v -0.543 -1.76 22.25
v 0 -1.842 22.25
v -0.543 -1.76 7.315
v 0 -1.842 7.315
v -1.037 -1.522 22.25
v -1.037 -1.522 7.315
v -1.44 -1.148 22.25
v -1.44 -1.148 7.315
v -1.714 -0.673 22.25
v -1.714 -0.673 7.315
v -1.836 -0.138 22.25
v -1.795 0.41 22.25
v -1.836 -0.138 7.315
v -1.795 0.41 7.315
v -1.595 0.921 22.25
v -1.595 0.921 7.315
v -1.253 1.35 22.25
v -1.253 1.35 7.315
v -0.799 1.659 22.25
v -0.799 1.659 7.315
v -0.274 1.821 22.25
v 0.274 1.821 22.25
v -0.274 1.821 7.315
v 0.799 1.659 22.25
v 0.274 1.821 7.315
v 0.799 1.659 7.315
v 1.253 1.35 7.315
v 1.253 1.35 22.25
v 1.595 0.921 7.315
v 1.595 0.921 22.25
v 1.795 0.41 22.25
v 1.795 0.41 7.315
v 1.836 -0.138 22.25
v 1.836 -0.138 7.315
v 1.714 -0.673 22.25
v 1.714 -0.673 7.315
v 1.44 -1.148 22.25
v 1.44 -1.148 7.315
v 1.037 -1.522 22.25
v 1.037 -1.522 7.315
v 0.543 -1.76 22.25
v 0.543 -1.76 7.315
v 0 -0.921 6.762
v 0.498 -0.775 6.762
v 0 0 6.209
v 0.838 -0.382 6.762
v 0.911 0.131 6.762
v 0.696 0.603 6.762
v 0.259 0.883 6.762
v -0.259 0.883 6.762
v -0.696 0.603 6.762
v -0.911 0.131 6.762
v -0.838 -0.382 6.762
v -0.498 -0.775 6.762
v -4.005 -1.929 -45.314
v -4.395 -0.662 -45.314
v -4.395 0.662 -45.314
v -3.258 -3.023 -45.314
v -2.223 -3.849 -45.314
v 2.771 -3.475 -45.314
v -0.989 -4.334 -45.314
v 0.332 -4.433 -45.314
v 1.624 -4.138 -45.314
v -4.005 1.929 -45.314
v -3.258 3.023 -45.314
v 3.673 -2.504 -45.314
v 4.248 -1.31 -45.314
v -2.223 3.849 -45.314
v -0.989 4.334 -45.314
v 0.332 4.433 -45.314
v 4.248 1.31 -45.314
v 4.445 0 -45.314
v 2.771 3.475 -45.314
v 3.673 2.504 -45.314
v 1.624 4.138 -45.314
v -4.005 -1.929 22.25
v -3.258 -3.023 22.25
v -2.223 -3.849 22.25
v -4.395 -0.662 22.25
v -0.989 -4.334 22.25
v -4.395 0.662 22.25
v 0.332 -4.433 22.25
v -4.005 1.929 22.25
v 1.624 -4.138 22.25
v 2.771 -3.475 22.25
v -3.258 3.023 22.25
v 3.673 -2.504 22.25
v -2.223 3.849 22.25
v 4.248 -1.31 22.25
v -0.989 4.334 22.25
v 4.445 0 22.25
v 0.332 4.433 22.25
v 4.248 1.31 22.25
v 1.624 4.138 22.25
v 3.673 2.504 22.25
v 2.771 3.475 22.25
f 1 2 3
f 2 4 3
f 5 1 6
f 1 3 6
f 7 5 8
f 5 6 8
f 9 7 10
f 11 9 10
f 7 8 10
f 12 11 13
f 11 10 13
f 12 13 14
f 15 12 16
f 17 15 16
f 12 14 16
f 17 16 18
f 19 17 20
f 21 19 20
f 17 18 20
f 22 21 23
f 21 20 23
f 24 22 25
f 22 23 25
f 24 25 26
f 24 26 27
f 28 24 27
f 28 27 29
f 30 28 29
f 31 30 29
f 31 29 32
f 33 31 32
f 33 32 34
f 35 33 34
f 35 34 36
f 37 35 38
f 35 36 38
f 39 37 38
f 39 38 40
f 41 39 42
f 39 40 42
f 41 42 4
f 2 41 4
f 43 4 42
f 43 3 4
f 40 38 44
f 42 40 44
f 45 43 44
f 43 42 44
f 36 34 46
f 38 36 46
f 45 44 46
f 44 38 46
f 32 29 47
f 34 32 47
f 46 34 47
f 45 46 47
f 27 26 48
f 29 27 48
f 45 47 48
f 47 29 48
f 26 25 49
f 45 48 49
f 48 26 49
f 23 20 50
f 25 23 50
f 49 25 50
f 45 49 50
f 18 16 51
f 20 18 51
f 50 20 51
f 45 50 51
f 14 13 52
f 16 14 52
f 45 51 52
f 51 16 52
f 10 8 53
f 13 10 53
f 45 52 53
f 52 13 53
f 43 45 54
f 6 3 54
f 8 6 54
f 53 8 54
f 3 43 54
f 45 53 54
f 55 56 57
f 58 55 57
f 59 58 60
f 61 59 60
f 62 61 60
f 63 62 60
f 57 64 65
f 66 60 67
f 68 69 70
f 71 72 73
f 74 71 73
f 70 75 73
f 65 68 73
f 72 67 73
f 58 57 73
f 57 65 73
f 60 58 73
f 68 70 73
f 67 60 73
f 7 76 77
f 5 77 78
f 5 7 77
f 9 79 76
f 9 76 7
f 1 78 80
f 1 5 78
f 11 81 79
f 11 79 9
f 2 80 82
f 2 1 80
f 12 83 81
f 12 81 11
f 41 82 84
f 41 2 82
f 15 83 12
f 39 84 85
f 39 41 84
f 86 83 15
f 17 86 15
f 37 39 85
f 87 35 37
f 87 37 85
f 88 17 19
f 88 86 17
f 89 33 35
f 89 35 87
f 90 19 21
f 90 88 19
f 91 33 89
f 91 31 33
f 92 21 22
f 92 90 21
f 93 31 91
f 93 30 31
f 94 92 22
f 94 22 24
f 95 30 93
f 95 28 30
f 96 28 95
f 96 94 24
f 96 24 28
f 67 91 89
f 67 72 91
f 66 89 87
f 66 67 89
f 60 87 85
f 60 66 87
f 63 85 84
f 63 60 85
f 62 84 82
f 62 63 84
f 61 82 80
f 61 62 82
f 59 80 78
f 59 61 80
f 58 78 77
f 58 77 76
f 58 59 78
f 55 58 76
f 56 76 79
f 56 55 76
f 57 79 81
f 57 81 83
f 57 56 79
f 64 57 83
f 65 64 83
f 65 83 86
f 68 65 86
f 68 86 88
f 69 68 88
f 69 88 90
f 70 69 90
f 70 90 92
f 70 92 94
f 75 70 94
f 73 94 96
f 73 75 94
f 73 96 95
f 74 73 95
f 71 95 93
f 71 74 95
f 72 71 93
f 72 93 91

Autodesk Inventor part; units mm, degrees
ref_plane "YZ Plane" through (0, 0, 0) normal (1, 0, 0) x (0, 1, 0)
ref_plane "XZ Plane" through (0, 0, 0) normal (0, 1, 0) x (-1, 0, 0)
ref_plane "XY Plane" through (0, 0, 0) normal (0, 0, 1) x (1, 0, 0)
sketch "Sketch1" plane through (0, 0, 0) normal (0, 0, 1) x (1, 0, 0)
  circle A0 centre (0, 0) radius 4.445
  dimension "d1" = 8.89
extrude "Extrusion1" add sketch "Sketch1" along normal mid plane 90.6272
sketch "Sketch2" plane through (0, 0, 45.3136) normal (0, 0, 1) x (1, 0, 0)
  point P0 (0, 0)
hole "Hole1" at (0, 0, 45.3136) direction (0, 0, -1) diameter 3.683 depth 37.9984 tip angle 118 thread size "10-24 UNC" class "2B" standard "ANSI Unified Screw Threads"
thicken "Thicken1" operation add thickness 23.0632 both sides no extend neighbours yes toward (0, 0, -1) faces at (3.5296, -0.4286, 45.3136)
properties part number "drive train standoff"
